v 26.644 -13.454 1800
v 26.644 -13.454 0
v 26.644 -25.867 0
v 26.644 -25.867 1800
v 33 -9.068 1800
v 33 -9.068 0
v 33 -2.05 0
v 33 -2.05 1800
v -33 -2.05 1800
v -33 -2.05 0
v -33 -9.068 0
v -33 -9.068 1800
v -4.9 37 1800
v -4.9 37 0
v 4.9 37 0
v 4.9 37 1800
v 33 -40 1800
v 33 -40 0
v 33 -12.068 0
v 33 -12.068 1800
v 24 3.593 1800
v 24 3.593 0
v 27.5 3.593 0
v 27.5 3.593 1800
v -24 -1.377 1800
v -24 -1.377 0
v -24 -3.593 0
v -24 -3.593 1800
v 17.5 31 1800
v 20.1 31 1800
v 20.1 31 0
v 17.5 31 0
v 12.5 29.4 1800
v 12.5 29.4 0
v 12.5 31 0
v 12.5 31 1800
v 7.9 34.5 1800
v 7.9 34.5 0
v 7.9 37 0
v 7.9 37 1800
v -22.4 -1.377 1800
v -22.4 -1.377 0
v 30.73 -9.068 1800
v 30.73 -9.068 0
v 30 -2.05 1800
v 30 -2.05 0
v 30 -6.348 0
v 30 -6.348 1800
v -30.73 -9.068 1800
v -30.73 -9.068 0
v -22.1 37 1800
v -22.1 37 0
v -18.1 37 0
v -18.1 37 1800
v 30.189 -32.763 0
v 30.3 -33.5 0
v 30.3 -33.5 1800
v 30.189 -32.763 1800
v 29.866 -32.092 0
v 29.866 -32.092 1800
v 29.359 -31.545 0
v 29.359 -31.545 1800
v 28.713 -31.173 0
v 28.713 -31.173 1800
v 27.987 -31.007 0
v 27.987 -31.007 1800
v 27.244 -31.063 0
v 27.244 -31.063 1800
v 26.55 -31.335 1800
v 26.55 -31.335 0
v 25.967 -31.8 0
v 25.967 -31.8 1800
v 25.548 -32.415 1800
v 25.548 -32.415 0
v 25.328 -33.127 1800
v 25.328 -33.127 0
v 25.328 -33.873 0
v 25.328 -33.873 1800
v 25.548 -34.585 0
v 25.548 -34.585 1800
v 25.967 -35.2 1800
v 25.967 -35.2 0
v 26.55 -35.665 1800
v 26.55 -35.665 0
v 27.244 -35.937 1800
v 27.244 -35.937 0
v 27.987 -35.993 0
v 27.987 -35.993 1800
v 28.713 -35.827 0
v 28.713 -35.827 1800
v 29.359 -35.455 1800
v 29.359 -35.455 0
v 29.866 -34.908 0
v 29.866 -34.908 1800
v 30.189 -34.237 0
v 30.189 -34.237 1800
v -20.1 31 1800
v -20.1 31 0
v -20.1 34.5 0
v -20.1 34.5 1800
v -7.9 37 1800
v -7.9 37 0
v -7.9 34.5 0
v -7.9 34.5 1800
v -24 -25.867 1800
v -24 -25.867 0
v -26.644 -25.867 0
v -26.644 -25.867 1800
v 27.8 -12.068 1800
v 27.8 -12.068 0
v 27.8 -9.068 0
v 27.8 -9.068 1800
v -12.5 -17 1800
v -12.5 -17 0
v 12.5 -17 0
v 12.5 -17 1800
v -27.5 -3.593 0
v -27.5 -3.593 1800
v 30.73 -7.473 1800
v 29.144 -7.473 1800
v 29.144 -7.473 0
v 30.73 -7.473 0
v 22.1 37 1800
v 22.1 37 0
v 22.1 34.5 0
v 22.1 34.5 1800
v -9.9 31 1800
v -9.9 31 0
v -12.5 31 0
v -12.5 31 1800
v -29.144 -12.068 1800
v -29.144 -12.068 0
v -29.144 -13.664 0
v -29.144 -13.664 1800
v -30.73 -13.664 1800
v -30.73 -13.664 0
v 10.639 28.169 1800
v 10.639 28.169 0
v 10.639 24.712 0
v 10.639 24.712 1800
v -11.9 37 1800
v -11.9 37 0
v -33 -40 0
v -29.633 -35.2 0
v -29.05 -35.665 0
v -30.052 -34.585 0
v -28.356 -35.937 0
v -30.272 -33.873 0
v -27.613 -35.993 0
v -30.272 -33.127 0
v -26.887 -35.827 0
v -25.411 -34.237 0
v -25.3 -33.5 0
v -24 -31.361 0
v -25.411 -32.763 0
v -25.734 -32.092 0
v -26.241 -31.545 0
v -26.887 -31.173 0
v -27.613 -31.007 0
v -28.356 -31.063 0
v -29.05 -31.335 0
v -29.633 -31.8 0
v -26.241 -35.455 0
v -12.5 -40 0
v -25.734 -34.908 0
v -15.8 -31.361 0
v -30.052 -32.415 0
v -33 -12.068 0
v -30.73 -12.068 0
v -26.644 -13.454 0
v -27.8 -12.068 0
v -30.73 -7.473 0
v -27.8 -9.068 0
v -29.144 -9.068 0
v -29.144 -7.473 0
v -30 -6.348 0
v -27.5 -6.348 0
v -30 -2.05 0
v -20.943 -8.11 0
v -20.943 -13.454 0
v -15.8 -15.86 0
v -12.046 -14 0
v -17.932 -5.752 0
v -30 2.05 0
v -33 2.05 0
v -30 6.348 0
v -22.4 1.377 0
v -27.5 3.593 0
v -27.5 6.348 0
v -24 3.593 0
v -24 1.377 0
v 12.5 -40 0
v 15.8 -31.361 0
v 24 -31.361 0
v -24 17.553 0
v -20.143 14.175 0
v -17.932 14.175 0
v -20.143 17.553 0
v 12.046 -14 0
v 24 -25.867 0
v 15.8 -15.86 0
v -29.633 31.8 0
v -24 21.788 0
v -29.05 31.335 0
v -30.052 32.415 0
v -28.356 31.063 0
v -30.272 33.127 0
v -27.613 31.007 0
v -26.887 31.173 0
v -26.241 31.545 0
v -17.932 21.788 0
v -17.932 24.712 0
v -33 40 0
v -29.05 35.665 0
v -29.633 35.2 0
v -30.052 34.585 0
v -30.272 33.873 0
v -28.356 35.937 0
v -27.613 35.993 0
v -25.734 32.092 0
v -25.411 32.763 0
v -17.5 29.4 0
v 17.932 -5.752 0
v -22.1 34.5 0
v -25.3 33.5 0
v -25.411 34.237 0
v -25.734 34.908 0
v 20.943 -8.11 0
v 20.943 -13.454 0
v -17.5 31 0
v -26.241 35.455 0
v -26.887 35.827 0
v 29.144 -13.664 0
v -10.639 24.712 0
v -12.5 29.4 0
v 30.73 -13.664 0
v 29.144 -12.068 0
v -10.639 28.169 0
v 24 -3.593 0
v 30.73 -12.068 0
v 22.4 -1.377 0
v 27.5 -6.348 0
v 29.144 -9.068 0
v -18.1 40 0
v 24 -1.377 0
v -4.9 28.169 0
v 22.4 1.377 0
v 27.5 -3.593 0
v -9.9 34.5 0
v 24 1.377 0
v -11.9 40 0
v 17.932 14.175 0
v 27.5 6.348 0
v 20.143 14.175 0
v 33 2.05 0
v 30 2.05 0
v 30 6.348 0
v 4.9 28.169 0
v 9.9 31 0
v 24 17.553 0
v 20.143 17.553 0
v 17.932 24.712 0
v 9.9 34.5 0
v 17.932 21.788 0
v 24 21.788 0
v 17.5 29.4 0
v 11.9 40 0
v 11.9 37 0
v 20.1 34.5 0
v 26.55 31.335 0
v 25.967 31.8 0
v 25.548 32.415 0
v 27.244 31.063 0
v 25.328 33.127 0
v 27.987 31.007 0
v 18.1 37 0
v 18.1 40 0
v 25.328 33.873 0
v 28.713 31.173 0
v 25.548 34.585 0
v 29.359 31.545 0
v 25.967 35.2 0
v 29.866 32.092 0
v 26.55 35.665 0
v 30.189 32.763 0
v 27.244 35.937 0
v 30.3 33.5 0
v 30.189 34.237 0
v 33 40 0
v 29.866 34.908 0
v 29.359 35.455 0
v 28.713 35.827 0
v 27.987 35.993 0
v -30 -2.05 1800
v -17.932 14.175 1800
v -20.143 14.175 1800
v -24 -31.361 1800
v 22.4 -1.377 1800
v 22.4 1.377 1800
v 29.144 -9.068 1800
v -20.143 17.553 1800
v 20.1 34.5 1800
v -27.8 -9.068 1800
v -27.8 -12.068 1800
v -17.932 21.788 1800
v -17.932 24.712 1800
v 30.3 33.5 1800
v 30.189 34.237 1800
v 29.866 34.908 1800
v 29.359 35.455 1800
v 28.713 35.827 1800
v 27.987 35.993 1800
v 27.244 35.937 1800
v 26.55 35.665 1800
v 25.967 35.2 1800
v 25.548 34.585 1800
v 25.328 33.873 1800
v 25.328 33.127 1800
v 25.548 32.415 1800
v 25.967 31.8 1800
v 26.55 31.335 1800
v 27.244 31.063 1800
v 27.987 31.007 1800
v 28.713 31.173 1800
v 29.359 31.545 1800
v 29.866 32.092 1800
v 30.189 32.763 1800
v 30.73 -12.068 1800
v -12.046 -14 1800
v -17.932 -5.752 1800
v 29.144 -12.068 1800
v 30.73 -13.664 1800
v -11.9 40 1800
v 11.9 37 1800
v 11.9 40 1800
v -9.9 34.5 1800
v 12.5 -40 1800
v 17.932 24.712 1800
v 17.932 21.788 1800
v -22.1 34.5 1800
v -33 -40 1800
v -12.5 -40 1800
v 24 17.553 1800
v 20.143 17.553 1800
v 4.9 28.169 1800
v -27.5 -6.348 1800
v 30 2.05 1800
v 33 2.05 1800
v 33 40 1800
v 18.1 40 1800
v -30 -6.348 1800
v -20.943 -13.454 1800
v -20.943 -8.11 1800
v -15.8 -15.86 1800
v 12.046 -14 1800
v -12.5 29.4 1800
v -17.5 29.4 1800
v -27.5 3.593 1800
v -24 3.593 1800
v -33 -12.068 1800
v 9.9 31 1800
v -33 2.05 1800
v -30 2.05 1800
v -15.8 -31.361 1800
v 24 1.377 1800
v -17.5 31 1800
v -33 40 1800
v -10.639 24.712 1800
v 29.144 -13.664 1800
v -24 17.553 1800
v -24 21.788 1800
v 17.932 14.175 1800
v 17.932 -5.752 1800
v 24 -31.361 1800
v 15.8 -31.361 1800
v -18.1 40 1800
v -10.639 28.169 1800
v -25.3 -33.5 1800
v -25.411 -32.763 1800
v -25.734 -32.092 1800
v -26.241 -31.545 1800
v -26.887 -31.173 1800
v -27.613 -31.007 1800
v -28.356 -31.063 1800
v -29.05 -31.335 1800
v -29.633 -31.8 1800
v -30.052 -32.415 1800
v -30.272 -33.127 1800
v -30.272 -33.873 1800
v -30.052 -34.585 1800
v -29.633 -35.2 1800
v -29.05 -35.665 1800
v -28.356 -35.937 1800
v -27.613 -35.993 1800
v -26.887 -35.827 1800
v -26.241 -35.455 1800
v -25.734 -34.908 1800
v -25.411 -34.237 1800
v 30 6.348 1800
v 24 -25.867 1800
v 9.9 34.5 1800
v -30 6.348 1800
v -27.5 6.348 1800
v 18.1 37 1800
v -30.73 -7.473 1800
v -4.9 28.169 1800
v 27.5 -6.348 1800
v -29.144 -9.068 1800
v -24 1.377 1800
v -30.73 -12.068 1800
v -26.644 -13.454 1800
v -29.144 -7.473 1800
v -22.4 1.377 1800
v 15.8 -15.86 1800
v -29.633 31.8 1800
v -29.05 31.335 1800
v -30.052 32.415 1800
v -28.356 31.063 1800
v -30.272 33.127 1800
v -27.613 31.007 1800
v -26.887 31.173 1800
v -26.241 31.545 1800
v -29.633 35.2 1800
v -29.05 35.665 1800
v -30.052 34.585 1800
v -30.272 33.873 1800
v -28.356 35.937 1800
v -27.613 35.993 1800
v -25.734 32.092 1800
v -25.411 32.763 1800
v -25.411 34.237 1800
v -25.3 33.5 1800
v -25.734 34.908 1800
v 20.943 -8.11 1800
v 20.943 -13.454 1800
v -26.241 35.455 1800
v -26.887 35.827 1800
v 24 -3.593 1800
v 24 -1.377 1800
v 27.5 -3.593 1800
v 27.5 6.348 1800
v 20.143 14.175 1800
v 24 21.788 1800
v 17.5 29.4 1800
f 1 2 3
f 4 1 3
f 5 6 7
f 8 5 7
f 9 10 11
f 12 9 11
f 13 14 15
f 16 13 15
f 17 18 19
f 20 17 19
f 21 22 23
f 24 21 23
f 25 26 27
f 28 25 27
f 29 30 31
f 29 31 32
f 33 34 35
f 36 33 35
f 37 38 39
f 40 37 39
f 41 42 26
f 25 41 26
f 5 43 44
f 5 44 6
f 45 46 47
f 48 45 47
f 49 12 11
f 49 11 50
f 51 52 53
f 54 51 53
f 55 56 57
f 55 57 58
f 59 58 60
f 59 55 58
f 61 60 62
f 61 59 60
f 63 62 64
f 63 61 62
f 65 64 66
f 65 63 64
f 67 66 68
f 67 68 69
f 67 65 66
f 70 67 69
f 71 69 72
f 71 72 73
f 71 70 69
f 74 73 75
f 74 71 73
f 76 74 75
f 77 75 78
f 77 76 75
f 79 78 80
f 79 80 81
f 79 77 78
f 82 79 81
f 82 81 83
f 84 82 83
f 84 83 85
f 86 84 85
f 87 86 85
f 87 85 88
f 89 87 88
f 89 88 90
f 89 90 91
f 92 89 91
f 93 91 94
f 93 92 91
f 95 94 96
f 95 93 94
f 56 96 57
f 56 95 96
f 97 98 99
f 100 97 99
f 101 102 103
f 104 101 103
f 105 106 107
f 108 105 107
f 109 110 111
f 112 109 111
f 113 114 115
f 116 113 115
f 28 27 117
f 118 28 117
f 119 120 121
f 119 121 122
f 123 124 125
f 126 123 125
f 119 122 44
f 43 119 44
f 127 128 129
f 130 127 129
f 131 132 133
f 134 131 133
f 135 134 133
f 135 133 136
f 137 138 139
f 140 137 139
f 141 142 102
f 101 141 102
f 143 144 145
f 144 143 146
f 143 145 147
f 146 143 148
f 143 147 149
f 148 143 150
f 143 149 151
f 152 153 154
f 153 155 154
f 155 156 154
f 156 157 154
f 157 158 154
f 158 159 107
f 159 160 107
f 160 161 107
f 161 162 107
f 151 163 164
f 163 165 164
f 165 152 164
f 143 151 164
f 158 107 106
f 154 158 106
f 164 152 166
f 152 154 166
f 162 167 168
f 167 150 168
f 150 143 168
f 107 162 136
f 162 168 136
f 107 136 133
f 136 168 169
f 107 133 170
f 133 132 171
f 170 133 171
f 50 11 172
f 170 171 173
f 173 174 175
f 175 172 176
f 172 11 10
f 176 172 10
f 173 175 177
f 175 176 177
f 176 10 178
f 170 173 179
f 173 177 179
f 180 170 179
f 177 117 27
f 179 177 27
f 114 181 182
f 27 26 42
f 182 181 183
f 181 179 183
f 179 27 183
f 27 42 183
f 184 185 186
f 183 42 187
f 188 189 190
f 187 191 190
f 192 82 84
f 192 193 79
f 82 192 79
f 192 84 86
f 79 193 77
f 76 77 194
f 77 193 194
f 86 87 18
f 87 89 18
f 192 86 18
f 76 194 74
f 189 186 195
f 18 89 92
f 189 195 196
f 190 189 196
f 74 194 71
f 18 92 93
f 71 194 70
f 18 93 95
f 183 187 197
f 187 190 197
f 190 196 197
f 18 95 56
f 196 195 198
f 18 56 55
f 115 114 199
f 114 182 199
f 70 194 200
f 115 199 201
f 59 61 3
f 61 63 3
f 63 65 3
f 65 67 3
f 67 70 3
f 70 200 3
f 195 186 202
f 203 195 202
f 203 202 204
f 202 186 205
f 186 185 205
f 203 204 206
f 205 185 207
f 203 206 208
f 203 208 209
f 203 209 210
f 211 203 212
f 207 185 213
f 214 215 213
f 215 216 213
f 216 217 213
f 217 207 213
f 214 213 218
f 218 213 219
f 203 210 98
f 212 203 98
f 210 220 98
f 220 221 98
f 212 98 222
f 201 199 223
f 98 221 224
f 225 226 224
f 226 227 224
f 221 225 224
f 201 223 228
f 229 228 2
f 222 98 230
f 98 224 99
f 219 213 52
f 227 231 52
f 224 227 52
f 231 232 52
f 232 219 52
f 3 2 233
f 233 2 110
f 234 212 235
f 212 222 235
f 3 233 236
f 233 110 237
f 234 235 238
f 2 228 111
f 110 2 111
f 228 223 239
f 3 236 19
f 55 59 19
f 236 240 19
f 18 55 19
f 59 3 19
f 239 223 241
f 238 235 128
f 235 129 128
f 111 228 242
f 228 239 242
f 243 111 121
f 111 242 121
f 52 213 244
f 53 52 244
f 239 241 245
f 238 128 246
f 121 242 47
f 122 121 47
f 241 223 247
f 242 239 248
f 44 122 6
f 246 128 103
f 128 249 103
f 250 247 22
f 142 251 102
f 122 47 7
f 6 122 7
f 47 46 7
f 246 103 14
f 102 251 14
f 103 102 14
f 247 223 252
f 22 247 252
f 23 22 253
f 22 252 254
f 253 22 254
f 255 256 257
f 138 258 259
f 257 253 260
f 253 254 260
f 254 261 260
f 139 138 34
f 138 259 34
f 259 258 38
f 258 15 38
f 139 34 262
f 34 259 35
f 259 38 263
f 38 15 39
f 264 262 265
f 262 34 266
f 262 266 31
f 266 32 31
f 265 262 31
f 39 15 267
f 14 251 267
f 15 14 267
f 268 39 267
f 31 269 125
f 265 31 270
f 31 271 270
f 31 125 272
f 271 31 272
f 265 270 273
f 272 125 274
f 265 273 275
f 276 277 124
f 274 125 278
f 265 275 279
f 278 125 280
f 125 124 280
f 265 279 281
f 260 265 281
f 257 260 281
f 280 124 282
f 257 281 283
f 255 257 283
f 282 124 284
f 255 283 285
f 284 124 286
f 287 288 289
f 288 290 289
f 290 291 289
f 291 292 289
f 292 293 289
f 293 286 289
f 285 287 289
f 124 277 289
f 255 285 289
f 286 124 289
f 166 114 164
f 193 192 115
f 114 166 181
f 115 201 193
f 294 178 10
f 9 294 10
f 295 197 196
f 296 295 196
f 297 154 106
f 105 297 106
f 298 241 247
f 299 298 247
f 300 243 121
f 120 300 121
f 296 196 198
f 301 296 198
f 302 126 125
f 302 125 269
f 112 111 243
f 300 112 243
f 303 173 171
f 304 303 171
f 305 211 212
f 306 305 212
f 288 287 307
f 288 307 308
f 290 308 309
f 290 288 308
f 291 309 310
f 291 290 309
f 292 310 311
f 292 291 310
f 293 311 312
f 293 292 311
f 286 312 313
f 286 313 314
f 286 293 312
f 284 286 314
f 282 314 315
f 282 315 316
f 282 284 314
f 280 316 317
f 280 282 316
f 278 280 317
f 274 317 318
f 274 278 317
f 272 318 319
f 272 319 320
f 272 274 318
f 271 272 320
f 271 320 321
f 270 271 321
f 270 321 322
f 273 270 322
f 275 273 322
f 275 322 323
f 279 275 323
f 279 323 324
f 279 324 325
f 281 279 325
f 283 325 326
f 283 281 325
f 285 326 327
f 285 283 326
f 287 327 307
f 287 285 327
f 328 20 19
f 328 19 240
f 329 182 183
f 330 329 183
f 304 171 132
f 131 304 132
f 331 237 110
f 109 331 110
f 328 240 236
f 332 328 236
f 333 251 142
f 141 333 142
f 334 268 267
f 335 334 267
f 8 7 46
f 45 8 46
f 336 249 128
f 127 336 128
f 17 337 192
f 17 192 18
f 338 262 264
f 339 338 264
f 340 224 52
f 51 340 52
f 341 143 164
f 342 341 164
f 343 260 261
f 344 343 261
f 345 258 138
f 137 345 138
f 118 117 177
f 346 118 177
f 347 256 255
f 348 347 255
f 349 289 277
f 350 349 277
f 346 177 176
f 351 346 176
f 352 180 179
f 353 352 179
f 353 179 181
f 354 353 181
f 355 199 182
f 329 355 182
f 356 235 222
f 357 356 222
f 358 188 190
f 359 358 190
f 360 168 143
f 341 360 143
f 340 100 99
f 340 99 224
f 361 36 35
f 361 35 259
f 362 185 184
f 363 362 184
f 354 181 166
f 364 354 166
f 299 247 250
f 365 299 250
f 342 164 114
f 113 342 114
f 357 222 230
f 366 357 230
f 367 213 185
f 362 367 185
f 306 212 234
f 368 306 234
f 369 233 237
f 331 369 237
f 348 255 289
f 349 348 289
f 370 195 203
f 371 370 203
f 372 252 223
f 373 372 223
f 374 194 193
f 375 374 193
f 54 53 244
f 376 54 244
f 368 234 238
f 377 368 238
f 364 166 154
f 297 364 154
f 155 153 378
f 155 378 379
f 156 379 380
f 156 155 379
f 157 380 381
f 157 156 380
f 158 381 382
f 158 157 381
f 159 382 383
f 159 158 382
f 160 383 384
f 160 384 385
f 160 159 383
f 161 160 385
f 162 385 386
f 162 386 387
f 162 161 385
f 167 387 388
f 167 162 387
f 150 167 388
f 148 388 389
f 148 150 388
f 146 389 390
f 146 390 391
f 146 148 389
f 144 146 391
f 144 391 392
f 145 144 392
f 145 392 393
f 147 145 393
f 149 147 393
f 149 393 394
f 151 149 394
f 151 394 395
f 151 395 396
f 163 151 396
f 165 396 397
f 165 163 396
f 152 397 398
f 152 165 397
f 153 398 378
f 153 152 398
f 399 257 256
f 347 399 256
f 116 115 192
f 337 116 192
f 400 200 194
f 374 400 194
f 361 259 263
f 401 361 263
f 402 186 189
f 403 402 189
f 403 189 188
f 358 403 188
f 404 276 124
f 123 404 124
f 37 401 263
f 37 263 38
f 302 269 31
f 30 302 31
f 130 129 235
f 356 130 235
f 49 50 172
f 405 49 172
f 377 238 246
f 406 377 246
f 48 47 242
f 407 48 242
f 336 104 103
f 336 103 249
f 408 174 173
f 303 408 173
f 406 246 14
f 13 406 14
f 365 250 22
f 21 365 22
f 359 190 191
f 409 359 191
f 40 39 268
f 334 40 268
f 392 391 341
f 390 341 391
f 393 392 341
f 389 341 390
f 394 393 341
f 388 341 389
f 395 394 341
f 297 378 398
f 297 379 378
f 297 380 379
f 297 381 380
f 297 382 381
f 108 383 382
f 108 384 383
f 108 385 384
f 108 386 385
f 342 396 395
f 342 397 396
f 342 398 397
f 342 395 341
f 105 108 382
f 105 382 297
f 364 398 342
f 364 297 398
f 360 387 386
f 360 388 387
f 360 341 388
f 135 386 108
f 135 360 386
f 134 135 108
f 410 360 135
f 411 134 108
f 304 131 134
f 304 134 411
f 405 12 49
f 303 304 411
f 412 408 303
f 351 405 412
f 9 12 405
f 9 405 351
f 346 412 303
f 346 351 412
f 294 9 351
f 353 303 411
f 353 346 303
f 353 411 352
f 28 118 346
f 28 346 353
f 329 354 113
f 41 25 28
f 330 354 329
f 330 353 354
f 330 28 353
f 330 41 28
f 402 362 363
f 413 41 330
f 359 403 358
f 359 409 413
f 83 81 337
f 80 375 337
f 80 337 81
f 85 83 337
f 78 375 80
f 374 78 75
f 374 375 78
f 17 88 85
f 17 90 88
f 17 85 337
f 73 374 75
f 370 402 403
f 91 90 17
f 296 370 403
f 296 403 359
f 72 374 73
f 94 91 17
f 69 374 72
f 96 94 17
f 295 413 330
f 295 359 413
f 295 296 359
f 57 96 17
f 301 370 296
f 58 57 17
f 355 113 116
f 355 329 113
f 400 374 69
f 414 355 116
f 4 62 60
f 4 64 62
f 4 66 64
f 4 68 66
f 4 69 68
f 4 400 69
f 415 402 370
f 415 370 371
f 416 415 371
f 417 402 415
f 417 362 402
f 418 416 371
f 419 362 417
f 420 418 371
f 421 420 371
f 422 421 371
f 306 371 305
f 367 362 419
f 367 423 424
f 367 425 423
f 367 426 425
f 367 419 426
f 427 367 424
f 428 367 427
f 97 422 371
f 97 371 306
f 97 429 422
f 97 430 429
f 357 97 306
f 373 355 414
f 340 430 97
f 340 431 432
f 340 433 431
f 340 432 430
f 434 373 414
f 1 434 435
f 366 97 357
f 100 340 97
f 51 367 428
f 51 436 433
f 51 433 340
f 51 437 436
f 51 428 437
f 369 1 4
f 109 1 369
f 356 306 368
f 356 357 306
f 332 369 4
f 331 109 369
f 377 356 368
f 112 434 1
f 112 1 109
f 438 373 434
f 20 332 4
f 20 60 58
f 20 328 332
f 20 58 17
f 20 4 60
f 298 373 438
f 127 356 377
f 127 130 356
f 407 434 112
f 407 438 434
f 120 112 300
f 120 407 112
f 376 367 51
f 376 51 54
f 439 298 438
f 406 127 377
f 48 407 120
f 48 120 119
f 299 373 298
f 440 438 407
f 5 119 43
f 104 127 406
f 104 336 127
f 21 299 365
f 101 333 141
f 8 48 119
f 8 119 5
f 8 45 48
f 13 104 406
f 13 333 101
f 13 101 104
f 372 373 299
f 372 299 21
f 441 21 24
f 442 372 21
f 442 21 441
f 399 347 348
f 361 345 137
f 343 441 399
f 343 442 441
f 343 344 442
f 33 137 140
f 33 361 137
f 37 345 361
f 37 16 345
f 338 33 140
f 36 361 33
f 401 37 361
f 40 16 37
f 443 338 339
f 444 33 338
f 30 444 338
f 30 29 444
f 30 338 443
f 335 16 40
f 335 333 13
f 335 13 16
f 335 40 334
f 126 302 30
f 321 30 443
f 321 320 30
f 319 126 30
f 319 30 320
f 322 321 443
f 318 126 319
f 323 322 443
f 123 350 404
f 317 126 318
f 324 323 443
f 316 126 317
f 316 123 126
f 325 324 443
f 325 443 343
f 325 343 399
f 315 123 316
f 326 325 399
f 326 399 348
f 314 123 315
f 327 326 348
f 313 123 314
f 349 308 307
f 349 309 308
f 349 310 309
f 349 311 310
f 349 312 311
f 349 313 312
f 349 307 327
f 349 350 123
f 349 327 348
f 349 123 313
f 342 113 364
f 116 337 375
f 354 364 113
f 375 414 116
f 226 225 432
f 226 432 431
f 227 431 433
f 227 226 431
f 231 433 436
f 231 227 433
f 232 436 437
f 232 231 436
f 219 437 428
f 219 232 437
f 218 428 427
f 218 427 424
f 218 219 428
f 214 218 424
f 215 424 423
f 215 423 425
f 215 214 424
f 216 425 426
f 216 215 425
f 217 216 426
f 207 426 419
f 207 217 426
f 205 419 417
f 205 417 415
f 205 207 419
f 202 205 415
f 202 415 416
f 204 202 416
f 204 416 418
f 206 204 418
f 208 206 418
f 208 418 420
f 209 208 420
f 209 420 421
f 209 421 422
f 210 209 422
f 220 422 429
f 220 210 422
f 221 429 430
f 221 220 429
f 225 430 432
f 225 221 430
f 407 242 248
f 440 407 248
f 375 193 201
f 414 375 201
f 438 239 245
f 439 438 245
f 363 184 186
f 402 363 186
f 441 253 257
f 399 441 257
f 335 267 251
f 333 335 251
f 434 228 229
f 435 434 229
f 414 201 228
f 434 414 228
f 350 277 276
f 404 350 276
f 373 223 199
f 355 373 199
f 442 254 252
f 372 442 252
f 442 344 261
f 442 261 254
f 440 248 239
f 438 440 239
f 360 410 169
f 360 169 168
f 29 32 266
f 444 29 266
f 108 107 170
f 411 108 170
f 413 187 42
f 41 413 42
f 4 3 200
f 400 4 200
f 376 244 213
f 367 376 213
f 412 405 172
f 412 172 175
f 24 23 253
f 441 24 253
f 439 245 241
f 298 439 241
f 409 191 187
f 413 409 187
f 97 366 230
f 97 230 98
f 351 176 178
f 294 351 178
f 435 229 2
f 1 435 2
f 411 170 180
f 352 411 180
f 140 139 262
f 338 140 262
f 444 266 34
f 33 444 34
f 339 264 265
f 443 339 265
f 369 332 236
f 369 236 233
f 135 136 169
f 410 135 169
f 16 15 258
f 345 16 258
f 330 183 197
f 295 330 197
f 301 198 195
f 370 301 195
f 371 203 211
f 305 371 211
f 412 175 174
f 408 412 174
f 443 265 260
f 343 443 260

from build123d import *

# Parameters (mm, degrees)
SKETCH_2_R      = 2.5
EXTRUDE_1_DEPTH = 1800


with BuildPart() as part:
    # 草图2 → 凸台-拉伸1 (new body)
    with BuildSketch(Plane.XY):
        Polygon((-18.1, 37), (-18.1, 40), (-33, 40), (-33, 2.049564589), (-30, 2.049564589), (-30, 6.348214799), (-27.5, 6.348214799), (-27.5, 3.593219783), (-24, 3.593219783), (-24, 1.376590931), (-22.4, 1.376590931), (-22.4, -1.376590931), (-24, -1.376590931), (-24, -3.593219783), (-27.5, -3.593219783), (-27.5, -6.348214799), (-30, -6.348214799), (-30, -2.049564589), (-33, -2.049564589), (-33, -9.06837916), (-30.729793093, -9.06837916), (-30.729793093, -7.473013176), (-29.144133649, -7.473013176), (-29.144133649, -9.06837916), (-27.8, -9.06837916), (-27.8, -10.56837916), (-27.8, -12.06837916), (-29.144133649, -12.06837916), (-29.144133649, -13.663745144), (-30.729793093, -13.663745144), (-30.729793093, -12.06837916), (-33, -12.06837916), (-33, -40), (-12.5, -40), (-12.5, -17), (12.5, -17), (12.5, -40), (33, -40), (33, -12.06837916), (30.729793093, -12.06837916), (30.729793093, -13.663745144), (29.144133649, -13.663745144), (29.144133649, -12.06837916), (27.8, -12.06837916), (27.8, -10.56837916), (27.8, -9.06837916), (29.144133649, -9.06837916), (29.144133649, -7.473013176), (30.729793093, -7.473013176), (30.729793093, -9.06837916), (33, -9.06837916), (33, -2.049564589), (30, -2.049564589), (30, -6.348214799), (27.5, -6.348214799), (27.5, -3.593219783), (24, -3.593219783), (24, -1.376590931), (22.4, -1.376590931), (22.4, 1.376590931), (24, 1.376590931), (24, 3.593219783), (27.5, 3.593219783), (27.5, 6.348214799), (30, 6.348214799), (30, 2.049564589), (33, 2.049564589), (33, 40), (18.1, 40), (18.1, 37), (22.1, 37), (22.1, 34.5), (20.1, 34.5), (20.1, 31), (17.5, 31), (17.5, 29.4), (12.5, 29.4), (12.5, 31), (9.9, 31), (9.9, 34.5), (7.9, 34.5), (7.9, 37), (11.9, 37), (11.9, 40), (-11.9, 40), (-11.9, 37), (-7.9, 37), (-7.9, 34.5), (-9.9, 34.5), (-9.9, 31), (-12.5, 31), (-12.5, 29.4), (-17.5, 29.4), (-17.5, 31), (-20.1, 31), (-20.1, 34.5), (-22.1, 34.5), (-22.1, 37), align=None)
        with Locations((-27.8, -33.5)):
            Circle(SKETCH_2_R, mode=Mode.SUBTRACT)
        Polygon((-20.943121928, -13.45406673), (-20.943121928, -8.11004262), (-15.8, -15.86033199), (-15.8, -31.360910729), (-24, -31.360910729), (-24, -25.86703472), (-26.644243735, -25.86703472), (-26.644243735, -13.45406673), align=None, mode=Mode.SUBTRACT)
        with Locations((27.8, -33.5)):
            Circle(SKETCH_2_R, mode=Mode.SUBTRACT)
        Polygon((24, -25.86703472), (24, -31.360910729), (15.8, -31.360910729), (15.8, -15.86033199), (20.943121928, -8.11004262), (20.943121928, -13.45406673), (26.644243735, -13.45406673), (26.644243735, -25.86703472), align=None, mode=Mode.SUBTRACT)
        with Locations((-27.8, 33.5)):
            Circle(SKETCH_2_R, mode=Mode.SUBTRACT)
        Polygon((-24.000227571, 17.552802839), (-24.000227571, 21.788095294), (-17.932238887, 21.788095294), (-17.932238887, 24.712463894), (-10.638888278, 24.712463894), (-10.638888278, 28.169211595), (-4.9, 28.169211595), (-4.9, 37), (4.9, 37), (4.9, 28.169211595), (10.638888278, 28.169211595), (10.638888278, 24.712463894), (17.932238887, 24.712463894), (17.932238887, 21.788095294), (24.000227571, 21.788095294), (24.000227571, 17.552802839), (20.143121928, 17.552802839), (20.143121928, 14.174652905), (17.932238887, 14.174652905), (17.932238887, -5.752091446), (12.045824189, -14), (0, -14), (-12.045824189, -14), (-17.932238887, -5.752091446), (-17.932238887, 14.174652905), (-20.143121928, 14.174652905), (-20.143121928, 17.552802839), align=None, mode=Mode.SUBTRACT)
        with Locations((27.8, 33.5)):
            Circle(SKETCH_2_R, mode=Mode.SUBTRACT)
    extrude(amount=EXTRUDE_1_DEPTH)


solid = part.part
